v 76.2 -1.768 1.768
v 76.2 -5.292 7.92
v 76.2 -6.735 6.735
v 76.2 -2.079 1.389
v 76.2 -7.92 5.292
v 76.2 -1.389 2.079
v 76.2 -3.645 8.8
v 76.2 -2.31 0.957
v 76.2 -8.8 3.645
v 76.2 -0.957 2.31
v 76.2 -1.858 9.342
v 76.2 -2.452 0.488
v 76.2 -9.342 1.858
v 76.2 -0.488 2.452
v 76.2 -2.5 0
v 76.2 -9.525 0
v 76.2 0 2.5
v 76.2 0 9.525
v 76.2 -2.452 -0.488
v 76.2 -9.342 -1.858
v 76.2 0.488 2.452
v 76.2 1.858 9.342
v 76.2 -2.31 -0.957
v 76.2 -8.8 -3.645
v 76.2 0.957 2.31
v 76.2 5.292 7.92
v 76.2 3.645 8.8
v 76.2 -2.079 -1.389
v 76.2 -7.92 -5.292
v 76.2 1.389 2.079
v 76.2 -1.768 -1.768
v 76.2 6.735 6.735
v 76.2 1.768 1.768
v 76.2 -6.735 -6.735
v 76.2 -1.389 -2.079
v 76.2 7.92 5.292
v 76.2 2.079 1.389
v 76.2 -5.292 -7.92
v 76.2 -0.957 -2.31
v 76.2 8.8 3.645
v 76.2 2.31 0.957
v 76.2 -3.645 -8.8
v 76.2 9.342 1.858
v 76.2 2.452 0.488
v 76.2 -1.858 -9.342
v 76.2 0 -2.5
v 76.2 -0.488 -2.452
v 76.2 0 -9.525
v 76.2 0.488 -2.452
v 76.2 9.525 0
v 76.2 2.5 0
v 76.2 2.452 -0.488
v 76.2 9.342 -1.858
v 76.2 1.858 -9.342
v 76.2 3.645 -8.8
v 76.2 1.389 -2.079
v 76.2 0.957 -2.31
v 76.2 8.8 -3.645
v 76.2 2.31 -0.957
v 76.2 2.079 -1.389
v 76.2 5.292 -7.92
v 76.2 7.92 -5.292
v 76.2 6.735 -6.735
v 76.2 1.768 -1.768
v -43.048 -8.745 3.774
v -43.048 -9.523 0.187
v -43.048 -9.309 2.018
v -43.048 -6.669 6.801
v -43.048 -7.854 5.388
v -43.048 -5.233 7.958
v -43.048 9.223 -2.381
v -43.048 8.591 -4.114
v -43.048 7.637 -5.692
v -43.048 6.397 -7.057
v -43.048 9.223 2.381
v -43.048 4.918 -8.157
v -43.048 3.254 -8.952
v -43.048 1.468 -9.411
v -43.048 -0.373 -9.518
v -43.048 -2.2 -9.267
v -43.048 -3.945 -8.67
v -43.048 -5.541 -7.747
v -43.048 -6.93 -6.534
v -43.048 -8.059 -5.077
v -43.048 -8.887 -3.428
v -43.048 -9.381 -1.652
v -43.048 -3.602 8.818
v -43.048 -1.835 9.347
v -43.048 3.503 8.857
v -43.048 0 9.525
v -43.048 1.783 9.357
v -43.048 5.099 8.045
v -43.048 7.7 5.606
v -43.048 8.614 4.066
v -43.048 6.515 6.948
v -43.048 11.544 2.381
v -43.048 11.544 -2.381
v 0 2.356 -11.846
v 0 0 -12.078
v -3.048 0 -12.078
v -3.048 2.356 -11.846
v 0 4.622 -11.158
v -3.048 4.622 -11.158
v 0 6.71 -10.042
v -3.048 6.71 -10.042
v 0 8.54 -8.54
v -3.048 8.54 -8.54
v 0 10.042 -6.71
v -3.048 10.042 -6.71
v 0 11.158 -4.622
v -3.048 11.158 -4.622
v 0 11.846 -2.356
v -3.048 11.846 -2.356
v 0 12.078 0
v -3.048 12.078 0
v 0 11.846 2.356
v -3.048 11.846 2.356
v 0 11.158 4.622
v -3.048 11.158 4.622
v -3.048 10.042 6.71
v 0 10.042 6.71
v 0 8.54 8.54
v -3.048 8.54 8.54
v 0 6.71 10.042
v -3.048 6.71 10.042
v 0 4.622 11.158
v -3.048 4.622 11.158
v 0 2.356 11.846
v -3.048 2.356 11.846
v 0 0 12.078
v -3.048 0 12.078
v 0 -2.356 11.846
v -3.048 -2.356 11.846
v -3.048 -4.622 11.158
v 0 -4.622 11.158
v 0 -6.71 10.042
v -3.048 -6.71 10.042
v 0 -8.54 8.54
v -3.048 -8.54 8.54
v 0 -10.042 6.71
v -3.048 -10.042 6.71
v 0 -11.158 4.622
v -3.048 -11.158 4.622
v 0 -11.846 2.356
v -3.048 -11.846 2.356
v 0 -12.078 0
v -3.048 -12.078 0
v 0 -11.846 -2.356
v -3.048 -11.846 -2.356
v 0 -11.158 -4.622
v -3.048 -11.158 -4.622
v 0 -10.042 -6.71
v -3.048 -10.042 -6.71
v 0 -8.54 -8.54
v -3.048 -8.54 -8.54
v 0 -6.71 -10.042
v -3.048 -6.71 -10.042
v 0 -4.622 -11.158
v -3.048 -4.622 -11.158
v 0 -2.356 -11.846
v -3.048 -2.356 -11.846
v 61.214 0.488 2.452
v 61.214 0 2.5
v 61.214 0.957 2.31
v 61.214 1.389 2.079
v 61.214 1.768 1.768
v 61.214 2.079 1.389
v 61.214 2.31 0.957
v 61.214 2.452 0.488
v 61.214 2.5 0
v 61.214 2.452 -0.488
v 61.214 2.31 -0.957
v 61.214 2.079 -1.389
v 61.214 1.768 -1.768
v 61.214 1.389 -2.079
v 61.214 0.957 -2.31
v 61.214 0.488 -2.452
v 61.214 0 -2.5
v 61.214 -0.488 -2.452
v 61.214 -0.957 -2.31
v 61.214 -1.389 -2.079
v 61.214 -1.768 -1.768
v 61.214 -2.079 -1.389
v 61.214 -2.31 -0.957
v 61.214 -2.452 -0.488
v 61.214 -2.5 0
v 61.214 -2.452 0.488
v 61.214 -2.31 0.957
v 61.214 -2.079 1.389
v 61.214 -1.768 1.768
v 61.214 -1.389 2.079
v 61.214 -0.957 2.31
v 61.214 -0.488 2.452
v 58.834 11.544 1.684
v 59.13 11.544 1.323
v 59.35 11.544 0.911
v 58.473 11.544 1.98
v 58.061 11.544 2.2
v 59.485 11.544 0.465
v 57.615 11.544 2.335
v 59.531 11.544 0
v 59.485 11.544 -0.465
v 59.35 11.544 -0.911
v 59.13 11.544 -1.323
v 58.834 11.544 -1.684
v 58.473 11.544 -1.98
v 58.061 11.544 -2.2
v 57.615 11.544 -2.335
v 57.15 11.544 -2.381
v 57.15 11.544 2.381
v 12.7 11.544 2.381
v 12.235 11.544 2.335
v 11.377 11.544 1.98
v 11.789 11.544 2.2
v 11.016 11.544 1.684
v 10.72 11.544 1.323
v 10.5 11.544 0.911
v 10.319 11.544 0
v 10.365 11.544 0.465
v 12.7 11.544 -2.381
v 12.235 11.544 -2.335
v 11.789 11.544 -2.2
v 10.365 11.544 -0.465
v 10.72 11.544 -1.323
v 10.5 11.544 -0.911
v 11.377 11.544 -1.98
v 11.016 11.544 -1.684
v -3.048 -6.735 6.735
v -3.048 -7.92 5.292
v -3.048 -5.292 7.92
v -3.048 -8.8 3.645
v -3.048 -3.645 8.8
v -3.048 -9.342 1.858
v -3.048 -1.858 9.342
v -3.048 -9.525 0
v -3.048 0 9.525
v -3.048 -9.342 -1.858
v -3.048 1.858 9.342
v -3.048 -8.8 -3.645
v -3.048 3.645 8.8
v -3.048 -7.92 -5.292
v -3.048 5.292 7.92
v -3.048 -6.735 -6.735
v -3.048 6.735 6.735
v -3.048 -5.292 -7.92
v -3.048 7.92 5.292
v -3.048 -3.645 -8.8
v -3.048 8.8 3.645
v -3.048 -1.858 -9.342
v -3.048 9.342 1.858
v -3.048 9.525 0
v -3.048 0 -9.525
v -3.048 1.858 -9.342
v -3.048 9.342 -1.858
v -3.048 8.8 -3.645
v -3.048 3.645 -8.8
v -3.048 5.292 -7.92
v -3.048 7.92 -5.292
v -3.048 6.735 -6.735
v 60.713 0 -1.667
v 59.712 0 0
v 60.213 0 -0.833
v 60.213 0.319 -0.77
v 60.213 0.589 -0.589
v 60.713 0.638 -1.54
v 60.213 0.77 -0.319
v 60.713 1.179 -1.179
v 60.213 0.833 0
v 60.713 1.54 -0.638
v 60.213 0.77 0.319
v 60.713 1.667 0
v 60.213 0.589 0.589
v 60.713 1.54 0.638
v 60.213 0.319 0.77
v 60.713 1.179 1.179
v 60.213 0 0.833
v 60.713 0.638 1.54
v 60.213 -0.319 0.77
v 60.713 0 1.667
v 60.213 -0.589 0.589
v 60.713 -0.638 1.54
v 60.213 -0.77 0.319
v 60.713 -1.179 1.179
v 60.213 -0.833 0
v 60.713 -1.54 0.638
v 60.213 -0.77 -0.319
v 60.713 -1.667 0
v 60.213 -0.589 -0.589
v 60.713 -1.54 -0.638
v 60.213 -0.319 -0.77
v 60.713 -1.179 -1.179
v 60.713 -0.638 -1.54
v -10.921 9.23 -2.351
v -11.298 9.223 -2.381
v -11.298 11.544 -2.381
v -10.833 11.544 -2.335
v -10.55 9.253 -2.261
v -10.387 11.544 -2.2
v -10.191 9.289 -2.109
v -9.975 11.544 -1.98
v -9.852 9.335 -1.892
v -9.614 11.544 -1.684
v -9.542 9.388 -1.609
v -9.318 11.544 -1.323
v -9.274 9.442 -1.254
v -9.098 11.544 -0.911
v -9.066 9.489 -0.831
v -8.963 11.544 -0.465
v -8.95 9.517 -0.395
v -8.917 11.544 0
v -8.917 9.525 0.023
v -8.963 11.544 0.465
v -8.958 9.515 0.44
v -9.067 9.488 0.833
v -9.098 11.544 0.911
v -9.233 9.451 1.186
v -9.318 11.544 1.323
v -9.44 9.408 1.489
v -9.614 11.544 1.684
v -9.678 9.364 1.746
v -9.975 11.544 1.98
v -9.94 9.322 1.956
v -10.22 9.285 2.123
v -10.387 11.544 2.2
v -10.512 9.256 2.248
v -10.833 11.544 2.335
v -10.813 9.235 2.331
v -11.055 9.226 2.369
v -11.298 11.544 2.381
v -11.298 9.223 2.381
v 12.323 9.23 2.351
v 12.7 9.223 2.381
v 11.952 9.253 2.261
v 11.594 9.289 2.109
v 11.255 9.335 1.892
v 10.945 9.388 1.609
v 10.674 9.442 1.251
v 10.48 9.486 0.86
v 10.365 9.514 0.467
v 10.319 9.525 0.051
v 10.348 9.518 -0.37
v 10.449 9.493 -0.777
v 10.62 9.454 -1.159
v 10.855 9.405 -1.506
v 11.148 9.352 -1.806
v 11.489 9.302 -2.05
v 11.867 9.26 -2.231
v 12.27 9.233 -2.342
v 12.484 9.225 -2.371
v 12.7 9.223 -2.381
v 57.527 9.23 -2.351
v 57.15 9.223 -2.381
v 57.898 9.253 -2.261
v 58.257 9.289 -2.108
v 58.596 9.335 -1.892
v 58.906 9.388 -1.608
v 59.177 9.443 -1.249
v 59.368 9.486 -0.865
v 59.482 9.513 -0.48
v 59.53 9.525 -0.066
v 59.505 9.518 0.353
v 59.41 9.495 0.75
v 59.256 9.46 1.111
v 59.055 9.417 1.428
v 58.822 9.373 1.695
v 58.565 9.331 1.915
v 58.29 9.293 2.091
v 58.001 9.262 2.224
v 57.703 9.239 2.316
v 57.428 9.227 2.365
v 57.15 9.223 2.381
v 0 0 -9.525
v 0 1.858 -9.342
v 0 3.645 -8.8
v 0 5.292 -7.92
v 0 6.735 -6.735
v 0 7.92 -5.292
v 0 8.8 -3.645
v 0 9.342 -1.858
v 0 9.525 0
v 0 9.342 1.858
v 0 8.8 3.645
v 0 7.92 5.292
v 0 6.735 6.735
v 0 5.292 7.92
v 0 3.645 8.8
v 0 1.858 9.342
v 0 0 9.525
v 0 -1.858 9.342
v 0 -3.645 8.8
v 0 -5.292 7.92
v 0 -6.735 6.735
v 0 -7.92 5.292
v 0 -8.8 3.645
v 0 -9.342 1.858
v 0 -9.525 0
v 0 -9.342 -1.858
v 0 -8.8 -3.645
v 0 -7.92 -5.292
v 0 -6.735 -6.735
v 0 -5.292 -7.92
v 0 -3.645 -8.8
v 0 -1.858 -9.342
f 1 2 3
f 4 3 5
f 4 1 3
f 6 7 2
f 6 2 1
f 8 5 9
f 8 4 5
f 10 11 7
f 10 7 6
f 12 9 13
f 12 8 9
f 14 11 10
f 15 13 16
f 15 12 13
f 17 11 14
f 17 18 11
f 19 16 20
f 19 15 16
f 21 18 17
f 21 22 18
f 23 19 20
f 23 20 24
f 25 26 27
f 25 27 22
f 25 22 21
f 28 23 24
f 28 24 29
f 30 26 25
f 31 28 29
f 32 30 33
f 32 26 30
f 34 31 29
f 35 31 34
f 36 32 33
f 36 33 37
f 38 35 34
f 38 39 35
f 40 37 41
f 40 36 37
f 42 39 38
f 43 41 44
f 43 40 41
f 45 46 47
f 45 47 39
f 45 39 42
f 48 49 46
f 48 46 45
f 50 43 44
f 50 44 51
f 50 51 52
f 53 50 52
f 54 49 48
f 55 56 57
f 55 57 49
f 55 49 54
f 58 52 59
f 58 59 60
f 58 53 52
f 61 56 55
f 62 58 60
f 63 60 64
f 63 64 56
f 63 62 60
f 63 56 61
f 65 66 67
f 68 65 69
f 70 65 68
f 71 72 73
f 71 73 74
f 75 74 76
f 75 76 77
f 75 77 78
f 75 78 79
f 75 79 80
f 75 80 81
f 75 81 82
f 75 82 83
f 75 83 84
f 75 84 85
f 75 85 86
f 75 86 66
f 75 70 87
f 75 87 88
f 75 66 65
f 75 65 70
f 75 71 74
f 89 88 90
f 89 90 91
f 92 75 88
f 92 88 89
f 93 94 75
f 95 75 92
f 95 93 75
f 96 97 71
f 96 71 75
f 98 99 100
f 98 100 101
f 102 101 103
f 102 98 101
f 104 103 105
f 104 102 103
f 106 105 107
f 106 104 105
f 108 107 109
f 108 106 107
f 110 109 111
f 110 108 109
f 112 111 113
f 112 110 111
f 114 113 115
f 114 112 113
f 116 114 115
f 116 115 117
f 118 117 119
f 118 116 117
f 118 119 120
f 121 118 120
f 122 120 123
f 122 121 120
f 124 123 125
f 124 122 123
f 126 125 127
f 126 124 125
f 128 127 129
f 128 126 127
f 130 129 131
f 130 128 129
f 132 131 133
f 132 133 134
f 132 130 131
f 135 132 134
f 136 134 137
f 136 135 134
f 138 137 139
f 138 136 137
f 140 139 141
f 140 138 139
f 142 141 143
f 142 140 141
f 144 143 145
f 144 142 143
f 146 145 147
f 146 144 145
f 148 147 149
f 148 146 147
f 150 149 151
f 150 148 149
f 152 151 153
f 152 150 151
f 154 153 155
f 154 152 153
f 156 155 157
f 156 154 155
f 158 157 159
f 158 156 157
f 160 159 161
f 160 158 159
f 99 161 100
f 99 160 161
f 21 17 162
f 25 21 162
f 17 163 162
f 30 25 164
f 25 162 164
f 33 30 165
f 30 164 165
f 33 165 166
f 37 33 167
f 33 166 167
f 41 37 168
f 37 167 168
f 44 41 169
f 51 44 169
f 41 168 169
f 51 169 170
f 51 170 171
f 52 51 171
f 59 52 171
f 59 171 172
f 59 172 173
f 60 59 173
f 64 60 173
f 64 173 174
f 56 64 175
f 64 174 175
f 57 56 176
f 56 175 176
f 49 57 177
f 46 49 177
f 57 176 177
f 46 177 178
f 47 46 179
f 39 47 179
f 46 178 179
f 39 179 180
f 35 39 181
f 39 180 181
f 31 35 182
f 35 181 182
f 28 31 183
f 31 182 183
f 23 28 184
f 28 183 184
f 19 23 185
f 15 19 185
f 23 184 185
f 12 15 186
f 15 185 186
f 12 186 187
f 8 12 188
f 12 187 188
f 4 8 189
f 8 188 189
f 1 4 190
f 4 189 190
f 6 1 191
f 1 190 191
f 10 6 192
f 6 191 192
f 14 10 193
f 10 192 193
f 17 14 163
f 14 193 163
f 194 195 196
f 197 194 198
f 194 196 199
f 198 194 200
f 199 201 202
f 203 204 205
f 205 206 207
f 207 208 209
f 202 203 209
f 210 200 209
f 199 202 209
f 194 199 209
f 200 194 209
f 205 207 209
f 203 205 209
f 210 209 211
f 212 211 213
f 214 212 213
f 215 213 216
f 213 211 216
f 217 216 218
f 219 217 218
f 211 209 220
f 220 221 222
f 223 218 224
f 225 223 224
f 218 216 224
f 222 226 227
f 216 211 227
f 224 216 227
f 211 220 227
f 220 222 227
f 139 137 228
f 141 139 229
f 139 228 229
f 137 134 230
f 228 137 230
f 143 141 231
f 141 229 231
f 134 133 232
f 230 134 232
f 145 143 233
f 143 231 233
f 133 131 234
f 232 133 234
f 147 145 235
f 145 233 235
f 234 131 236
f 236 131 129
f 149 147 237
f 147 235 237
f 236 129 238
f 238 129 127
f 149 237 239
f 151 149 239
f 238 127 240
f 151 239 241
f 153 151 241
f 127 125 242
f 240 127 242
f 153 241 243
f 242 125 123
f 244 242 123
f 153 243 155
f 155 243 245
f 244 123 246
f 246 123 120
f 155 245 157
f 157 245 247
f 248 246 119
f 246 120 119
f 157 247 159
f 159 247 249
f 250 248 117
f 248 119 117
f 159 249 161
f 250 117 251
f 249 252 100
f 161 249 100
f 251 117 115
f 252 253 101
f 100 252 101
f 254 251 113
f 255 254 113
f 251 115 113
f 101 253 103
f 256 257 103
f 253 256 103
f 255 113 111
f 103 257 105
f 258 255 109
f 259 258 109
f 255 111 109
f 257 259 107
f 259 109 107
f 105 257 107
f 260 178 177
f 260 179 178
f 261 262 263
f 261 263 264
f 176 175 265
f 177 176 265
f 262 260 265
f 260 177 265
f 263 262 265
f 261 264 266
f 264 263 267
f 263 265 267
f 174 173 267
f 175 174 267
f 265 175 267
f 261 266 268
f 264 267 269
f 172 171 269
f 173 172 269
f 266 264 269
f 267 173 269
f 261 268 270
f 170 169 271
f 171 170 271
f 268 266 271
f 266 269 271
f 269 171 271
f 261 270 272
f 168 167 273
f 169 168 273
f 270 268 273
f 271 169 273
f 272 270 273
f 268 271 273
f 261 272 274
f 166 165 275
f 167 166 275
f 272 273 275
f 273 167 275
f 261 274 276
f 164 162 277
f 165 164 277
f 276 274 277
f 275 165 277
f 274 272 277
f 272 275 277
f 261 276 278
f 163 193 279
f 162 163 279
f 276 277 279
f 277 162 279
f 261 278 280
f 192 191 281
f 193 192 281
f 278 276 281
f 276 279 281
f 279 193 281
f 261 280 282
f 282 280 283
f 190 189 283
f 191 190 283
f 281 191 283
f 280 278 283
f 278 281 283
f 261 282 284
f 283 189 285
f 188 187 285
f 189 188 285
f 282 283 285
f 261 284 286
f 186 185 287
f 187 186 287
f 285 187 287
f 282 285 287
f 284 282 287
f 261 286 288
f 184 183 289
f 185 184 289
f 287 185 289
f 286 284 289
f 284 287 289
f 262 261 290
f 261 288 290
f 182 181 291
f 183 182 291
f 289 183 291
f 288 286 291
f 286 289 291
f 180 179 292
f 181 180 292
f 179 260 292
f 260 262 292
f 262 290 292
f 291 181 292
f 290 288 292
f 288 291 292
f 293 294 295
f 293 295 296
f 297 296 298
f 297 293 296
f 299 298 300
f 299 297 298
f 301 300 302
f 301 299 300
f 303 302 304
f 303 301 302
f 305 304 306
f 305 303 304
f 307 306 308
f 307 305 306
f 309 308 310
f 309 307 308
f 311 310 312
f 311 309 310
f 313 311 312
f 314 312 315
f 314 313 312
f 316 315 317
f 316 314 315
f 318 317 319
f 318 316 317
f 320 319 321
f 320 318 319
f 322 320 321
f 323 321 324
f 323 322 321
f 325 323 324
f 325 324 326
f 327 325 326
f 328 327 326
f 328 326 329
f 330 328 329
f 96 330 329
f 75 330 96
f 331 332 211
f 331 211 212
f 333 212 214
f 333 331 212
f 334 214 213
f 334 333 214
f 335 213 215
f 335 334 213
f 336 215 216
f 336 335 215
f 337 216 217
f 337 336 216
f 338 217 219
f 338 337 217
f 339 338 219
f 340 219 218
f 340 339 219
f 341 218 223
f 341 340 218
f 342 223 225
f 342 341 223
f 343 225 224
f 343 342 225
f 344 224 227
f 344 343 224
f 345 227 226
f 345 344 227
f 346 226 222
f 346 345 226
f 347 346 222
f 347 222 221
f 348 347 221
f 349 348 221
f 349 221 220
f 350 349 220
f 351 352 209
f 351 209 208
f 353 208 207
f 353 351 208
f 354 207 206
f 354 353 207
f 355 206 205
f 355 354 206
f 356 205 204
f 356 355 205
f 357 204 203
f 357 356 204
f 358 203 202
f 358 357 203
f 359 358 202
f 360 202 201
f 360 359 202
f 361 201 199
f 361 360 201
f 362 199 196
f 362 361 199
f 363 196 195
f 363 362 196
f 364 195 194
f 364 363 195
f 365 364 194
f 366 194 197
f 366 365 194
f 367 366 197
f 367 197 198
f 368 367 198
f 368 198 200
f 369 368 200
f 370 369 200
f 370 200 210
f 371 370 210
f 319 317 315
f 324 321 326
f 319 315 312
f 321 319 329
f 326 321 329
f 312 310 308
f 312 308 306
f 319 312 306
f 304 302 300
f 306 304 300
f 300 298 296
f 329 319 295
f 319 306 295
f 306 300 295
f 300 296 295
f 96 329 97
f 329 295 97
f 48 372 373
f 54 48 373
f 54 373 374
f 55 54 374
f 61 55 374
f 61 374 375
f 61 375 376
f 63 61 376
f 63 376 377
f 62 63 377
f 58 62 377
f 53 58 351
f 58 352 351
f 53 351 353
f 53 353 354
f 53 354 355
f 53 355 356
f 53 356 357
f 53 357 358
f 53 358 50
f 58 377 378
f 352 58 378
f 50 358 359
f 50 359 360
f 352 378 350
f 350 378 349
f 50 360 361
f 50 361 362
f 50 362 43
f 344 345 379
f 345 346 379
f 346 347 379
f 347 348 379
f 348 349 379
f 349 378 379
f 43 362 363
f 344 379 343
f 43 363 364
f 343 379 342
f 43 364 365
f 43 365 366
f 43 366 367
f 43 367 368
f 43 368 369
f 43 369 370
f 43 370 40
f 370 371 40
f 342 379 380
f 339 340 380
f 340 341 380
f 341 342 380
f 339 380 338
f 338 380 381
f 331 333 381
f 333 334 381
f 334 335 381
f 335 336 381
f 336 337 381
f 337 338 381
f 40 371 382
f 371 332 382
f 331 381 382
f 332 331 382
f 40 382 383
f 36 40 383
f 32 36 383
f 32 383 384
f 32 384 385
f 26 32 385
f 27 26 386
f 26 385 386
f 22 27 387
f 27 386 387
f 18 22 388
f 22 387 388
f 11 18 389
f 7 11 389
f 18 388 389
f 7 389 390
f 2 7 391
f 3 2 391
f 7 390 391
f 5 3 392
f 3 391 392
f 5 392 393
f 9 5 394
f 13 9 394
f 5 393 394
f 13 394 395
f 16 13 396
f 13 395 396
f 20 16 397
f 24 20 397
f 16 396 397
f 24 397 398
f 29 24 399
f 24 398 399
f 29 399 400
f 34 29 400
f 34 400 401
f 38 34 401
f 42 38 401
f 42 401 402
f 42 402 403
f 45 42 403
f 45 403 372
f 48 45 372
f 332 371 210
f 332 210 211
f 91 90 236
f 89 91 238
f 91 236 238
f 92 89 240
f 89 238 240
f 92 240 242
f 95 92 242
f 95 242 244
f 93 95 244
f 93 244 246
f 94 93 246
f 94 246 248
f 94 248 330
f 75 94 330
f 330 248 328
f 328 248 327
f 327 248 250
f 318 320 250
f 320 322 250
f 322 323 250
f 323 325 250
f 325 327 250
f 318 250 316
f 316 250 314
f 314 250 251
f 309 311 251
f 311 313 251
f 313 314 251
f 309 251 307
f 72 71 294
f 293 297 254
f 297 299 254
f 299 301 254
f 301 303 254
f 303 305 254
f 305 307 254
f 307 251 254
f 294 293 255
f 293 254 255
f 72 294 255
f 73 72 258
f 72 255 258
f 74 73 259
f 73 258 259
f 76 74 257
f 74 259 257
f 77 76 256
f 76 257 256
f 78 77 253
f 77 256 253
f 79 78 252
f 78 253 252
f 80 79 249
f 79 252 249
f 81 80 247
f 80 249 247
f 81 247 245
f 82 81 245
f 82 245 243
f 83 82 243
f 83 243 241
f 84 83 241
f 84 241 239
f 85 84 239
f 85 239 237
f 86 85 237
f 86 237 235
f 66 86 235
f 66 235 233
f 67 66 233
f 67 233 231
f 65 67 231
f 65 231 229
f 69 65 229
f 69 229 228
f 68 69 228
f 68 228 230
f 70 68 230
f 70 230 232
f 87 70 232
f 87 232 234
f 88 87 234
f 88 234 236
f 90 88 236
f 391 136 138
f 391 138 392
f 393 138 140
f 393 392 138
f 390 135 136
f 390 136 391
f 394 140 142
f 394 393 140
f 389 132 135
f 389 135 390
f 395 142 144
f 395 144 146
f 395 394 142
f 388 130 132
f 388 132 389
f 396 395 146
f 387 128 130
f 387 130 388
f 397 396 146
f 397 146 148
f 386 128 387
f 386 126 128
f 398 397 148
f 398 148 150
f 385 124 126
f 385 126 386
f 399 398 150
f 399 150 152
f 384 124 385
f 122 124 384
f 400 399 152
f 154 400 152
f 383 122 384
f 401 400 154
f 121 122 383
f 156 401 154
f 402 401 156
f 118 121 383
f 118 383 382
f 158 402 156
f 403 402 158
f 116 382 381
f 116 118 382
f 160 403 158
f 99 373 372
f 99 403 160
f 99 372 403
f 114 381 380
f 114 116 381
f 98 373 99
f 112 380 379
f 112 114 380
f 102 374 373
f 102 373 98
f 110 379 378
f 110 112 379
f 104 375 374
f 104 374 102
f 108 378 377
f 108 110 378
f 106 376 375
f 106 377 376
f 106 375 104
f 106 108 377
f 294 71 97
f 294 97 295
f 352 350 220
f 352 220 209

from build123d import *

# Parameters (mm, degrees)
SKETCH1_R             = 12.0777
BOSS_EXTRUDE1_DEPTH   = 3.048
SKETCH2_R             = 9.525
BOSS_EXTRUDE2_DEPTH   = 40
SKETCH3_R             = 9.525
BOSS_EXTRUDE3_DEPTH   = 76.2
M6_TAPPED_HOLE1_D     = 5
M6_TAPPED_HOLE1_DEPTH = 14.986
M6_TAPPED_HOLE1_TIP   = 1.502151548
BOSS_EXTRUDE4_DEPTH   = 4.7625


with BuildPart() as part:
    # Sketch1 → Boss-Extrude1 (new body)
    with BuildSketch(Plane(origin=(0, 0, 0), x_dir=(0, 0, -1), z_dir=(1, 0, 0))):
        Circle(SKETCH1_R)
    extrude(amount=-BOSS_EXTRUDE1_DEPTH)

    # Sketch2 → Boss-Extrude2 (add)
    with BuildSketch(Plane.ZY.offset(3.048)):
        Circle(SKETCH2_R)
    extrude(amount=BOSS_EXTRUDE2_DEPTH)

    # Sketch3 → Boss-Extrude3 (add)
    with BuildSketch(Plane(origin=(0, 0, 0), x_dir=(0, 0, -1), z_dir=(1, 0, 0))):
        Circle(SKETCH3_R)
    extrude(amount=BOSS_EXTRUDE3_DEPTH)

    # M6 Tapped Hole1
    with Locations(Plane(origin=(76.2, 0, 0), x_dir=(0, 0, -1), z_dir=(1, 0, 0))):
        with Locations((0, 0)):
            Hole(M6_TAPPED_HOLE1_D / 2, depth=M6_TAPPED_HOLE1_DEPTH)
            with Locations((0, 0, -(M6_TAPPED_HOLE1_DEPTH + M6_TAPPED_HOLE1_TIP / 2))):  # 118° drill point
                Cone(0, M6_TAPPED_HOLE1_D / 2, M6_TAPPED_HOLE1_TIP, mode=Mode.SUBTRACT)

    # Sketch33 → Boss-Extrude4 (add)
    with BuildSketch(Plane(origin=(0, 6.7818, 0), x_dir=(1, 0, 0), z_dir=(0, 1, 0))):
        with BuildLine():
            Line((12.7, 2.38125), (57.15, 2.38125))
            ThreePointArc((57.15, 2.38125), (59.53125, 0), (57.15, -2.38125))
            Line((57.15, -2.38125), (12.7, -2.38125))
            ThreePointArc((12.7, -2.38125), (10.31875, 0), (12.7, 2.38125))
        make_face()
        with BuildLine():
            Line((-43.048, 2.38125), (-11.298, 2.38125))
            ThreePointArc((-11.298, 2.38125), (-8.91675, 0), (-11.298, -2.38125))
            Line((-11.298, -2.38125), (-43.048, -2.38125))
            Line((-43.048, -2.38125), (-43.048, 2.38125))
        make_face()
    extrude(amount=BOSS_EXTRUDE4_DEPTH)


solid = part.part
